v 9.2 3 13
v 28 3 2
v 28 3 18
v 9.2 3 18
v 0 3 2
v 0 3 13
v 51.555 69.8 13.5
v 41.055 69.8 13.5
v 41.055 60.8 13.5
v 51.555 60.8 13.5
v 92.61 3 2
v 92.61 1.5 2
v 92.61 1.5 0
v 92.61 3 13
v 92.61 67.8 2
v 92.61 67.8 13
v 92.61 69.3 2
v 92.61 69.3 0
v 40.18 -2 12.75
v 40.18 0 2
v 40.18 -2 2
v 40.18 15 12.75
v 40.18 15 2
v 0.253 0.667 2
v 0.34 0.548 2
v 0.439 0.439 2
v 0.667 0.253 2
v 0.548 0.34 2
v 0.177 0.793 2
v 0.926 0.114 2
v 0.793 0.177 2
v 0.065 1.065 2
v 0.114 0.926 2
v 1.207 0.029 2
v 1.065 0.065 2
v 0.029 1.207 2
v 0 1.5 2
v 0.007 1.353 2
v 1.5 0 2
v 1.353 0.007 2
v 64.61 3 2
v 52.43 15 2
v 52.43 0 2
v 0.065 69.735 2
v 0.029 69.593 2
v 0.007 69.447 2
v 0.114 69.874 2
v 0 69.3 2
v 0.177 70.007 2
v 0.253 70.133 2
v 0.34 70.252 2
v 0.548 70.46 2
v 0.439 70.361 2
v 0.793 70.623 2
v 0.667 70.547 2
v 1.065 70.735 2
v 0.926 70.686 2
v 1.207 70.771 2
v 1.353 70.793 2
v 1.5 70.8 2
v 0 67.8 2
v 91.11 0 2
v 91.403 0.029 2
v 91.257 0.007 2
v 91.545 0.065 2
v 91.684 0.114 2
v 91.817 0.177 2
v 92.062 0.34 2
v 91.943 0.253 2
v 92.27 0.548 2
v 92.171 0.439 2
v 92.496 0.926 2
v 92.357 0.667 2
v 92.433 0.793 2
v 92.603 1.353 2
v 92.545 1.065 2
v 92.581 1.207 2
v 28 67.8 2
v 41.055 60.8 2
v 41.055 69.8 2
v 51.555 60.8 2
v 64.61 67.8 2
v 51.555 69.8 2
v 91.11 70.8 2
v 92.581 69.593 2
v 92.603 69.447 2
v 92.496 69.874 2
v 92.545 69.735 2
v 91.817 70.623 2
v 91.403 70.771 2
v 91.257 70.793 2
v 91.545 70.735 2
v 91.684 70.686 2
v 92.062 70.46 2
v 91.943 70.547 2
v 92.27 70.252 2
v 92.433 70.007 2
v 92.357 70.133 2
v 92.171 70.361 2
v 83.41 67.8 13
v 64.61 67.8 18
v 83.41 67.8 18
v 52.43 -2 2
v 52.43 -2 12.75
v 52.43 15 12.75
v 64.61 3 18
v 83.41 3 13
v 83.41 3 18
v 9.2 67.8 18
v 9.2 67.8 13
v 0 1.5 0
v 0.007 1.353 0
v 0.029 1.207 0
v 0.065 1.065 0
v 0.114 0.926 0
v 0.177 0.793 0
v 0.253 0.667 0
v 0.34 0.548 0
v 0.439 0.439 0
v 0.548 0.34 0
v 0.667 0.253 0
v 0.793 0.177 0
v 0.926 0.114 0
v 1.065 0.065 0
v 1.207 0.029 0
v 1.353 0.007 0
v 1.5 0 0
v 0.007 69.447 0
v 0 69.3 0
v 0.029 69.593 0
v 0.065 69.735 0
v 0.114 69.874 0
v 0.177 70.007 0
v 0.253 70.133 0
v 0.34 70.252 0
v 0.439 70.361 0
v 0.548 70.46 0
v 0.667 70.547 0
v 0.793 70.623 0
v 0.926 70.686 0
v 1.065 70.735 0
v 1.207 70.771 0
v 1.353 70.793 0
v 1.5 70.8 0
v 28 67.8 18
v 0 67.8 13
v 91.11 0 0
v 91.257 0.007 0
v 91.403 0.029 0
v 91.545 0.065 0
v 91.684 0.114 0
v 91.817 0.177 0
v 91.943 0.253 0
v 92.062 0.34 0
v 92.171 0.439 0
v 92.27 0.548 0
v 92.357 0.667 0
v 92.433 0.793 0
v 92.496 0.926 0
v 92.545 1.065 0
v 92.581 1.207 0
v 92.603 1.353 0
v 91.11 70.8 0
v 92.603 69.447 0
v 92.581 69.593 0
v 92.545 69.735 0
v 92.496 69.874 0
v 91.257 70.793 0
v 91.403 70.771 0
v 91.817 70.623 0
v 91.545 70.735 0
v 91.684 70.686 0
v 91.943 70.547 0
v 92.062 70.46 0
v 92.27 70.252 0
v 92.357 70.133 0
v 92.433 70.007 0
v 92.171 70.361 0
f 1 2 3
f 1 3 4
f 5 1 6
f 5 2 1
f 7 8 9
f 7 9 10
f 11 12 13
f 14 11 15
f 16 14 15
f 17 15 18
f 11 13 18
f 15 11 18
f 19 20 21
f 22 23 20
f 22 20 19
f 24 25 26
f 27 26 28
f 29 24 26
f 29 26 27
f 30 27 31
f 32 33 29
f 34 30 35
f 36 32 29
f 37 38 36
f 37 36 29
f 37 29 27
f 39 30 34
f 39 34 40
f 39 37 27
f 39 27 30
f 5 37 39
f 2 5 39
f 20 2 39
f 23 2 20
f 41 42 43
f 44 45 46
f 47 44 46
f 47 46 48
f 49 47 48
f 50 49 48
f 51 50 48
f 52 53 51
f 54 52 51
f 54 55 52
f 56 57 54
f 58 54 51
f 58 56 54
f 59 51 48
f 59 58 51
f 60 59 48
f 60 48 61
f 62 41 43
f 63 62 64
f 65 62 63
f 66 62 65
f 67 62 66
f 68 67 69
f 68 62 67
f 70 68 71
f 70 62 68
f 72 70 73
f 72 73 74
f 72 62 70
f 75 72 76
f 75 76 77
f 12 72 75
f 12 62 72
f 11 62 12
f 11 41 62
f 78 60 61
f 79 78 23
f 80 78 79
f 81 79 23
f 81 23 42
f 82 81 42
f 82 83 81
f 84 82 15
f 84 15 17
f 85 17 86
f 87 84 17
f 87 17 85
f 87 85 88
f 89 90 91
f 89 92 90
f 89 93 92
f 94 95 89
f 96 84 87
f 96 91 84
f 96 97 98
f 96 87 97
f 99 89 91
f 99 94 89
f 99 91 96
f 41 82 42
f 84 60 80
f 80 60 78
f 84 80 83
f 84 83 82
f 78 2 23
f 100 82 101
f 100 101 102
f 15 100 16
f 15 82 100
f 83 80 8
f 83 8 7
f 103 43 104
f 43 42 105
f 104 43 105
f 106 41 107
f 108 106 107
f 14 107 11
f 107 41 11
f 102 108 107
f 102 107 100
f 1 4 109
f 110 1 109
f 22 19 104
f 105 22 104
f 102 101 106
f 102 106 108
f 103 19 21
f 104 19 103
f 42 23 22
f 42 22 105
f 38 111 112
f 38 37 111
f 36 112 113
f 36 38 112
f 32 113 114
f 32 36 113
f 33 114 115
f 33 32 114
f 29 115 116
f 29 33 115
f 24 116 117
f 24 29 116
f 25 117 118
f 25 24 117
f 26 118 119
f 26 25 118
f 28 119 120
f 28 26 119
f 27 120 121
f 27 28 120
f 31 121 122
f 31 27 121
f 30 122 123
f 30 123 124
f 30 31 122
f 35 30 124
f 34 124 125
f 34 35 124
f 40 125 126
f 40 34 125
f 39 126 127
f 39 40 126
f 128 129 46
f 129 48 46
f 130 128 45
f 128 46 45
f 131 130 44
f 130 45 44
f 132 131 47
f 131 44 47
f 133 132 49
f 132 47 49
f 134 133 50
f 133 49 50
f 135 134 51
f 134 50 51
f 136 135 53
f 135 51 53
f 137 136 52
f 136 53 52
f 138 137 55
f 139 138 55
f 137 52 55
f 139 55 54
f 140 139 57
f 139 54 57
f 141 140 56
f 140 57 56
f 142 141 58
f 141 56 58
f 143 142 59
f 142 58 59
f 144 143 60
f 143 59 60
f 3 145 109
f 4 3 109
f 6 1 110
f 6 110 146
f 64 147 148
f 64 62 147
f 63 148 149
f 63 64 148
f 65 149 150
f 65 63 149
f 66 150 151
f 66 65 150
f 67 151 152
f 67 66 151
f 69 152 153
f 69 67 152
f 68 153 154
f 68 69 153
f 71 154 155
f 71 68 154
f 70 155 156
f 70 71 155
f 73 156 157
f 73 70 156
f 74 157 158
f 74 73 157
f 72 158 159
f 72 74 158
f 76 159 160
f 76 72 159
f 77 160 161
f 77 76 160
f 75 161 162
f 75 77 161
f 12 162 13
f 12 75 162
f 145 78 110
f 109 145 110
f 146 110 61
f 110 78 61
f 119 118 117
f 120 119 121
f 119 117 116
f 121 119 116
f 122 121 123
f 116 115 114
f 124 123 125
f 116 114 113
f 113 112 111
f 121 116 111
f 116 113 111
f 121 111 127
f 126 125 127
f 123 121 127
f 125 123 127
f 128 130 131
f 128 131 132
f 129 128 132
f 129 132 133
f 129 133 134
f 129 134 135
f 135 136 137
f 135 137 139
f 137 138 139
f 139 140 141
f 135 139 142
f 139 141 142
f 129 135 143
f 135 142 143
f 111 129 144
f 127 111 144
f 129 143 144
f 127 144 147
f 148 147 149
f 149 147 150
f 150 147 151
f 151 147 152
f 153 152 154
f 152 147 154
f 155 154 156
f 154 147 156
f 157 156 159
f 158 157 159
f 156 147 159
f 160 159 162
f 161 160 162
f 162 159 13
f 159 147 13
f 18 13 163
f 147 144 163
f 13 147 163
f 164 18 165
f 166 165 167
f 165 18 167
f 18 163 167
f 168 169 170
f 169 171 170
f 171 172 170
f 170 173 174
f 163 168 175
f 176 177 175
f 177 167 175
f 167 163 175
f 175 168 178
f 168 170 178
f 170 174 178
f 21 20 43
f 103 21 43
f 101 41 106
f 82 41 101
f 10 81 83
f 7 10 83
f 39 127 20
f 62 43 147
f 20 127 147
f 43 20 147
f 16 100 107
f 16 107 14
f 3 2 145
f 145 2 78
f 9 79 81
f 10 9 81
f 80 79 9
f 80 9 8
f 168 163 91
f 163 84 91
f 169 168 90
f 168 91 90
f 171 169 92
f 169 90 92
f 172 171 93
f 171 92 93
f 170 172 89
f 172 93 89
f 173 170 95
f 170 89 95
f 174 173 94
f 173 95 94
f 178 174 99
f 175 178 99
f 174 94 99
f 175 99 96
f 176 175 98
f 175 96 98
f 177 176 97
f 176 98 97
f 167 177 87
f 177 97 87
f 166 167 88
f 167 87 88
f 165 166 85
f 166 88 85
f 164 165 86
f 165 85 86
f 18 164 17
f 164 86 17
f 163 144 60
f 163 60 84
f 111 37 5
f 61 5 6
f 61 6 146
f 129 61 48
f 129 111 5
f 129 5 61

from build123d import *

# Parameters (mm, degrees)
F0_W      = 92.61
F0_H      = 70.8
F1_DEPTH  = 2
F2_W      = 28
F2_H      = 64.8
F3_DEPTH  = 16
F4_W      = 9.2
F4_H      = 64.8
F5_DEPTH  = 5
F7_W      = 12.25
F7_H      = 15
F8_DEPTH  = 10.75
F9_R      = 1.5
F10_W     = 12.25
F10_H     = 10.75
F11_DEPTH = 2
F12_W     = 10.5
F12_H     = 9
F13_DEPTH = 11.5


# Not quite as in the source:
# - a pattern or mirror of a feature is missing from the dataset's text; its kind, count and spacing are read off the source's solid


with BuildPart() as f1:
    # F0 (on Top) → F1 (new body)
    with BuildSketch(Plane.XY):
        with Locations((46.305, 35.4)):
            Rectangle(F0_W, F0_H)
    extrude(amount=F1_DEPTH)

    # F2 (on face) → F3 (join)
    with BuildSketch(Plane.XY.offset(2)):
        with Locations((78.61, 35.4)):
            Rectangle(F2_W, F2_H)
    f3 = extrude(amount=F3_DEPTH)

    # F3_copies: F3 across plane
    add(f3.mirror(Plane(origin=(46.305, 0, 0), x_dir=(0, 0, -1), z_dir=(-1, 0, 0))))

    # F4 (on face) → F5 (cut)
    with BuildSketch(Plane.XY.offset(18)):
        with Locations((88.01, 35.4)):
            Rectangle(F4_W, F4_H)
    f5 = extrude(amount=-F5_DEPTH, mode=Mode.SUBTRACT)

    # F5_copies: F5 across plane
    add(f5.mirror(Plane(origin=(46.305, 0, 0), x_dir=(0, 0, -1), z_dir=(-1, 0, 0))), mode=Mode.SUBTRACT)

    # F7 (on face) → F8 (join)
    with BuildSketch(Plane.XY.offset(2)):
        with Locations((46.305, 7.5)):
            Rectangle(F7_W, F7_H)
    extrude(amount=F8_DEPTH)

    # F9
    f9_edges = [f1.edges().sort_by_distance(p)[0] for p in [
        (92.61, 70.8, 1),
        (0, 70.8, 1),
        (0, 0, 1),
        (92.61, 0, 1),
    ]]
    fillet(f9_edges, radius=F9_R)

    # F10 (on face) → F11 (join)
    with BuildSketch(Plane.XZ):
        with Locations((46.305, 7.375)):
            Rectangle(F10_W, F10_H)
    extrude(amount=F11_DEPTH)

    # F12 (on face) → F13 (join)
    with BuildSketch(Plane.XY.offset(2)):
        with Locations((46.305, 65.3)):
            Rectangle(F12_W, F12_H)
    extrude(amount=F13_DEPTH)


solid = f1.part
